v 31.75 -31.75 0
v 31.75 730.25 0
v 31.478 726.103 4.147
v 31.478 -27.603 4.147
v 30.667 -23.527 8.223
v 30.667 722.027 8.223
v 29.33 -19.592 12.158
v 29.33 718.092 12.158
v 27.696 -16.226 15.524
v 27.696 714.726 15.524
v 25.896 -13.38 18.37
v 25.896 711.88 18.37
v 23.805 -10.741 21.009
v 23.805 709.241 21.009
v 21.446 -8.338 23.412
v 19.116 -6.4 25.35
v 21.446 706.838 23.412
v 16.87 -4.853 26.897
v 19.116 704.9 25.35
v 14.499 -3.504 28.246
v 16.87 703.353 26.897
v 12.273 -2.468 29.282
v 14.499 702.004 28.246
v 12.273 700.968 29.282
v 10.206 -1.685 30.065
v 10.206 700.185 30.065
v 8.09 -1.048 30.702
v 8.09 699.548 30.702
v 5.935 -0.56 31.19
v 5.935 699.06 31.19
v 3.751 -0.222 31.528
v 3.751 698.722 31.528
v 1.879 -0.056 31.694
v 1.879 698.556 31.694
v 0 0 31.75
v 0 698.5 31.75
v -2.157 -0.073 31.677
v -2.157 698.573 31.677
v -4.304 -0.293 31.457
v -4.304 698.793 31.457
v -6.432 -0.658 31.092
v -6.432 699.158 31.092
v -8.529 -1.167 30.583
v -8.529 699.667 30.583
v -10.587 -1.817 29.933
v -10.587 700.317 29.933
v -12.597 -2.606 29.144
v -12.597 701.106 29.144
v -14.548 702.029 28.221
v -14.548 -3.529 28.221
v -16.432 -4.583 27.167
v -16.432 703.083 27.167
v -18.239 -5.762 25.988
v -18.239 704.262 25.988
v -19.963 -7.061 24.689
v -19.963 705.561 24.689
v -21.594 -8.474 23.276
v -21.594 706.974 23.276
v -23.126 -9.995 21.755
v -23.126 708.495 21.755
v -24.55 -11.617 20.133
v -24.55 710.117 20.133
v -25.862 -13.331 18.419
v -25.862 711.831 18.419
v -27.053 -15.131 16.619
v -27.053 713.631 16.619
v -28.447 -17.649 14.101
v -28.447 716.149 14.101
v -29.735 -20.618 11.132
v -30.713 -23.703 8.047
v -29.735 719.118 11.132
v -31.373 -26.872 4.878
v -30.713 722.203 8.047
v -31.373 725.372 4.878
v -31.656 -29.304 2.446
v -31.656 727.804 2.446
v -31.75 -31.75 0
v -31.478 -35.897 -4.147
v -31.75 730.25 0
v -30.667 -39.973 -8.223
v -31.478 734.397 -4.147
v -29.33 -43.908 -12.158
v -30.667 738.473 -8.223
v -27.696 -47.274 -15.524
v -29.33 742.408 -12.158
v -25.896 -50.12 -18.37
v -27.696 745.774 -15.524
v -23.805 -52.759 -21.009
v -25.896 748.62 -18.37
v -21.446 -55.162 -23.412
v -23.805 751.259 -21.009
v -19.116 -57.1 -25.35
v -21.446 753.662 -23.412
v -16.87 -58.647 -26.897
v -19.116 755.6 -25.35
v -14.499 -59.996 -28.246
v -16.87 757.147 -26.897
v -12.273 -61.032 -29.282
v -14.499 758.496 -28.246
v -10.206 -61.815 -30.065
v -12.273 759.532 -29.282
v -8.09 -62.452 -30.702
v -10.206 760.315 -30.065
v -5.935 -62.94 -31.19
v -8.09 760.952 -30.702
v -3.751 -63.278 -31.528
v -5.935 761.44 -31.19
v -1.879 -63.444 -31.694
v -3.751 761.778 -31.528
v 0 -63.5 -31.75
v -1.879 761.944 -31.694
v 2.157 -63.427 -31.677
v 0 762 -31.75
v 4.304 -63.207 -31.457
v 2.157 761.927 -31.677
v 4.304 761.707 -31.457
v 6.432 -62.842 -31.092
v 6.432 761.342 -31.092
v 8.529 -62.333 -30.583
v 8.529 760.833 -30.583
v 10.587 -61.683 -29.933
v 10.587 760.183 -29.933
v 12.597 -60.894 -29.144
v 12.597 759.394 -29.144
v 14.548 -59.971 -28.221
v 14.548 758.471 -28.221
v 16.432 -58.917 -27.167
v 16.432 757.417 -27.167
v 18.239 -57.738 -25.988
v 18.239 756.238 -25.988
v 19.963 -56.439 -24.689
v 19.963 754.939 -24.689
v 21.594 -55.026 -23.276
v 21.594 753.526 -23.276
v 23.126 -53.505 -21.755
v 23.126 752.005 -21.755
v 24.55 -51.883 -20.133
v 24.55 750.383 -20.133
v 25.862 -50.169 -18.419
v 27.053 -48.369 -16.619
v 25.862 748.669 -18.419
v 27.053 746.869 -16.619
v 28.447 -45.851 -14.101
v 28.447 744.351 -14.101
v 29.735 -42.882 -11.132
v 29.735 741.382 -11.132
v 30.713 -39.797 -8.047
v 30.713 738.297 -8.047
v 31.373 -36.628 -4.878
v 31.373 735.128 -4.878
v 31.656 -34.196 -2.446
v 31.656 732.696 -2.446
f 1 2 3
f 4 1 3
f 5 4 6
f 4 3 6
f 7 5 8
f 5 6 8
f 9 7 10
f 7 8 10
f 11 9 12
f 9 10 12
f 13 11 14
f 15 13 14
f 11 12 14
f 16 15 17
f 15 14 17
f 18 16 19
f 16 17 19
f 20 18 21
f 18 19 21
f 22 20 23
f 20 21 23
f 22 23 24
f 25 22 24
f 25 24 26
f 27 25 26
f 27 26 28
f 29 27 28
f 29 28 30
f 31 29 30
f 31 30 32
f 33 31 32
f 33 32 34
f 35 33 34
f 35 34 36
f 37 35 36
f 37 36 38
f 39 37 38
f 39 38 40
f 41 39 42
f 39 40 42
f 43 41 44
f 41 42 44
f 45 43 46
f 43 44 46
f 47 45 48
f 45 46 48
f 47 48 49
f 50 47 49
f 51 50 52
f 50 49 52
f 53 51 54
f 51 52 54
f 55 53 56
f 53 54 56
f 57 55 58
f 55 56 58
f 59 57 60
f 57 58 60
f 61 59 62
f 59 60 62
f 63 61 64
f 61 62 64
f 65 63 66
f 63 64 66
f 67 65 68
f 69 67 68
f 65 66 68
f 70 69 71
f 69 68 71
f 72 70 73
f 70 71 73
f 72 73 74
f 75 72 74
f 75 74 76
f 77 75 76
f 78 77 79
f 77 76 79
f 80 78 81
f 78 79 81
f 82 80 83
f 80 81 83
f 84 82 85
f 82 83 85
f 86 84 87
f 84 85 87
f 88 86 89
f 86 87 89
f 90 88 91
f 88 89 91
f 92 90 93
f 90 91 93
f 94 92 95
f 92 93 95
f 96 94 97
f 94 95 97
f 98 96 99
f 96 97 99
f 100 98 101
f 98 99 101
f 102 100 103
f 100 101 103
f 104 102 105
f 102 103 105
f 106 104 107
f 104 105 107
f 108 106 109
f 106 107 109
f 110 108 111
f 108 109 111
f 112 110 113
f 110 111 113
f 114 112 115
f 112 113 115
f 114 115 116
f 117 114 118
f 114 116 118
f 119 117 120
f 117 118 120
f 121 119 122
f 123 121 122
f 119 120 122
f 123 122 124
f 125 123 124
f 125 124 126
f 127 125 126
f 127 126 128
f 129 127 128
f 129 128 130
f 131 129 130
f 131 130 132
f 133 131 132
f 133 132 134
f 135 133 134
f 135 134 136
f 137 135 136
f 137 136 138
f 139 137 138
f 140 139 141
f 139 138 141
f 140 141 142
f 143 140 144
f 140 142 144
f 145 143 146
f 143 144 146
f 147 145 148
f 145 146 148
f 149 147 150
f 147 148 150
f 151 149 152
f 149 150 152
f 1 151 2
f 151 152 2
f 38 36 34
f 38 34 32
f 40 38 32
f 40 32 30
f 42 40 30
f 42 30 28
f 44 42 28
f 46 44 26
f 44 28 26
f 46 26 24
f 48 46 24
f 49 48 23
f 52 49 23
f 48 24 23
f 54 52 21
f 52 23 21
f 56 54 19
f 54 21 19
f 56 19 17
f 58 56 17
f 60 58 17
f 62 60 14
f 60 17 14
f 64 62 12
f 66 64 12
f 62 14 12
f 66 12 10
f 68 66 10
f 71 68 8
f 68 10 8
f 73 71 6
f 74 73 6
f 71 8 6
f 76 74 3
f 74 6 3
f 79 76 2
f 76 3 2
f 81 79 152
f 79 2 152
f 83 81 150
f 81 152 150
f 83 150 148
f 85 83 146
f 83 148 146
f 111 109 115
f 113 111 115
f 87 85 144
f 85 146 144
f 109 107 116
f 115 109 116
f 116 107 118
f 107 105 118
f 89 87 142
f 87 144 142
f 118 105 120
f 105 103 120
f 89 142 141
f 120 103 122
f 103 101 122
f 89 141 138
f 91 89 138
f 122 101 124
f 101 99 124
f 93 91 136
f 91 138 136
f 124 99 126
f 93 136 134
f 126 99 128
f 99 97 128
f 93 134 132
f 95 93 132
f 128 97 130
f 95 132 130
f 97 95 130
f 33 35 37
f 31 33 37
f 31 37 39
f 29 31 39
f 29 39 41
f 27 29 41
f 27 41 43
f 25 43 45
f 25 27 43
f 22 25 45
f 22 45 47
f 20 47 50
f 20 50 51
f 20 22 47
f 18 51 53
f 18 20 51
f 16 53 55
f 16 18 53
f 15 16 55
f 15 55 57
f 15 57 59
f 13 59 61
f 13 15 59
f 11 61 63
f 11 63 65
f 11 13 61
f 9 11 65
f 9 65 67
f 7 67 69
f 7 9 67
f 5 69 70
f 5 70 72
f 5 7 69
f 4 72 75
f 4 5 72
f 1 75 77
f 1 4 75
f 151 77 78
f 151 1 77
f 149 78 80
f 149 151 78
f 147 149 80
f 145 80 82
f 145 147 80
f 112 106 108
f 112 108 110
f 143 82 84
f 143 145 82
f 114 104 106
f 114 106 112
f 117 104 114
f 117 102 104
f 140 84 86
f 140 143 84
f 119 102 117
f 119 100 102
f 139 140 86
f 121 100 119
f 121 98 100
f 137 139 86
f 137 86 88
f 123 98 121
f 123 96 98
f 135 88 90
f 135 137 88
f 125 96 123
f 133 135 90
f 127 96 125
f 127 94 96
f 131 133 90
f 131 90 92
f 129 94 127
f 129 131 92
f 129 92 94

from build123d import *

# Parameters (mm, degrees)
SKETCH1_R           = 31.75
BOSS_EXTRUDE1_DEPTH = 698.5
SKETCH2_R           = 31.75
BOSS_EXTRUDE2_DEPTH = 63.5
SKETCH3_R           = 31.75
BOSS_EXTRUDE3_DEPTH = 63.5
CUT_EXTRUDE1_DEPTH  = 63.5


with BuildPart() as part:
    # Sketch1 → Boss-Extrude1 (new body)
    with BuildSketch(Plane(origin=(0, 0, 0), x_dir=(1, 0, 0), z_dir=(0, 1, 0))):
        Circle(SKETCH1_R)
    extrude(amount=BOSS_EXTRUDE1_DEPTH)

    # Sketch2 → Boss-Extrude2 (add)
    with BuildSketch(Plane(origin=(0, 698.5, 0), x_dir=(1, 0, 0), z_dir=(0, 1, 0))):
        Circle(SKETCH2_R)
    extrude(amount=BOSS_EXTRUDE2_DEPTH)

    # Sketch3 → Boss-Extrude3 (add)
    with BuildSketch(Plane.XZ):
        Circle(SKETCH3_R)
    extrude(amount=BOSS_EXTRUDE3_DEPTH)

    # Sketch4 → Cut-Extrude1 (cut)
    with BuildSketch(Plane(origin=(31.75, 0, 0), x_dir=(0, 0, -1), z_dir=(1, 0, 0))):
        Polygon((-31.75, 762), (-31.75, 698.5), (31.75, 762), align=None)
        Polygon((-31.75, 0), (31.75, -63.5), (-31.75, -63.5), align=None)
    extrude(amount=-CUT_EXTRUDE1_DEPTH, mode=Mode.SUBTRACT)


solid = part.part
